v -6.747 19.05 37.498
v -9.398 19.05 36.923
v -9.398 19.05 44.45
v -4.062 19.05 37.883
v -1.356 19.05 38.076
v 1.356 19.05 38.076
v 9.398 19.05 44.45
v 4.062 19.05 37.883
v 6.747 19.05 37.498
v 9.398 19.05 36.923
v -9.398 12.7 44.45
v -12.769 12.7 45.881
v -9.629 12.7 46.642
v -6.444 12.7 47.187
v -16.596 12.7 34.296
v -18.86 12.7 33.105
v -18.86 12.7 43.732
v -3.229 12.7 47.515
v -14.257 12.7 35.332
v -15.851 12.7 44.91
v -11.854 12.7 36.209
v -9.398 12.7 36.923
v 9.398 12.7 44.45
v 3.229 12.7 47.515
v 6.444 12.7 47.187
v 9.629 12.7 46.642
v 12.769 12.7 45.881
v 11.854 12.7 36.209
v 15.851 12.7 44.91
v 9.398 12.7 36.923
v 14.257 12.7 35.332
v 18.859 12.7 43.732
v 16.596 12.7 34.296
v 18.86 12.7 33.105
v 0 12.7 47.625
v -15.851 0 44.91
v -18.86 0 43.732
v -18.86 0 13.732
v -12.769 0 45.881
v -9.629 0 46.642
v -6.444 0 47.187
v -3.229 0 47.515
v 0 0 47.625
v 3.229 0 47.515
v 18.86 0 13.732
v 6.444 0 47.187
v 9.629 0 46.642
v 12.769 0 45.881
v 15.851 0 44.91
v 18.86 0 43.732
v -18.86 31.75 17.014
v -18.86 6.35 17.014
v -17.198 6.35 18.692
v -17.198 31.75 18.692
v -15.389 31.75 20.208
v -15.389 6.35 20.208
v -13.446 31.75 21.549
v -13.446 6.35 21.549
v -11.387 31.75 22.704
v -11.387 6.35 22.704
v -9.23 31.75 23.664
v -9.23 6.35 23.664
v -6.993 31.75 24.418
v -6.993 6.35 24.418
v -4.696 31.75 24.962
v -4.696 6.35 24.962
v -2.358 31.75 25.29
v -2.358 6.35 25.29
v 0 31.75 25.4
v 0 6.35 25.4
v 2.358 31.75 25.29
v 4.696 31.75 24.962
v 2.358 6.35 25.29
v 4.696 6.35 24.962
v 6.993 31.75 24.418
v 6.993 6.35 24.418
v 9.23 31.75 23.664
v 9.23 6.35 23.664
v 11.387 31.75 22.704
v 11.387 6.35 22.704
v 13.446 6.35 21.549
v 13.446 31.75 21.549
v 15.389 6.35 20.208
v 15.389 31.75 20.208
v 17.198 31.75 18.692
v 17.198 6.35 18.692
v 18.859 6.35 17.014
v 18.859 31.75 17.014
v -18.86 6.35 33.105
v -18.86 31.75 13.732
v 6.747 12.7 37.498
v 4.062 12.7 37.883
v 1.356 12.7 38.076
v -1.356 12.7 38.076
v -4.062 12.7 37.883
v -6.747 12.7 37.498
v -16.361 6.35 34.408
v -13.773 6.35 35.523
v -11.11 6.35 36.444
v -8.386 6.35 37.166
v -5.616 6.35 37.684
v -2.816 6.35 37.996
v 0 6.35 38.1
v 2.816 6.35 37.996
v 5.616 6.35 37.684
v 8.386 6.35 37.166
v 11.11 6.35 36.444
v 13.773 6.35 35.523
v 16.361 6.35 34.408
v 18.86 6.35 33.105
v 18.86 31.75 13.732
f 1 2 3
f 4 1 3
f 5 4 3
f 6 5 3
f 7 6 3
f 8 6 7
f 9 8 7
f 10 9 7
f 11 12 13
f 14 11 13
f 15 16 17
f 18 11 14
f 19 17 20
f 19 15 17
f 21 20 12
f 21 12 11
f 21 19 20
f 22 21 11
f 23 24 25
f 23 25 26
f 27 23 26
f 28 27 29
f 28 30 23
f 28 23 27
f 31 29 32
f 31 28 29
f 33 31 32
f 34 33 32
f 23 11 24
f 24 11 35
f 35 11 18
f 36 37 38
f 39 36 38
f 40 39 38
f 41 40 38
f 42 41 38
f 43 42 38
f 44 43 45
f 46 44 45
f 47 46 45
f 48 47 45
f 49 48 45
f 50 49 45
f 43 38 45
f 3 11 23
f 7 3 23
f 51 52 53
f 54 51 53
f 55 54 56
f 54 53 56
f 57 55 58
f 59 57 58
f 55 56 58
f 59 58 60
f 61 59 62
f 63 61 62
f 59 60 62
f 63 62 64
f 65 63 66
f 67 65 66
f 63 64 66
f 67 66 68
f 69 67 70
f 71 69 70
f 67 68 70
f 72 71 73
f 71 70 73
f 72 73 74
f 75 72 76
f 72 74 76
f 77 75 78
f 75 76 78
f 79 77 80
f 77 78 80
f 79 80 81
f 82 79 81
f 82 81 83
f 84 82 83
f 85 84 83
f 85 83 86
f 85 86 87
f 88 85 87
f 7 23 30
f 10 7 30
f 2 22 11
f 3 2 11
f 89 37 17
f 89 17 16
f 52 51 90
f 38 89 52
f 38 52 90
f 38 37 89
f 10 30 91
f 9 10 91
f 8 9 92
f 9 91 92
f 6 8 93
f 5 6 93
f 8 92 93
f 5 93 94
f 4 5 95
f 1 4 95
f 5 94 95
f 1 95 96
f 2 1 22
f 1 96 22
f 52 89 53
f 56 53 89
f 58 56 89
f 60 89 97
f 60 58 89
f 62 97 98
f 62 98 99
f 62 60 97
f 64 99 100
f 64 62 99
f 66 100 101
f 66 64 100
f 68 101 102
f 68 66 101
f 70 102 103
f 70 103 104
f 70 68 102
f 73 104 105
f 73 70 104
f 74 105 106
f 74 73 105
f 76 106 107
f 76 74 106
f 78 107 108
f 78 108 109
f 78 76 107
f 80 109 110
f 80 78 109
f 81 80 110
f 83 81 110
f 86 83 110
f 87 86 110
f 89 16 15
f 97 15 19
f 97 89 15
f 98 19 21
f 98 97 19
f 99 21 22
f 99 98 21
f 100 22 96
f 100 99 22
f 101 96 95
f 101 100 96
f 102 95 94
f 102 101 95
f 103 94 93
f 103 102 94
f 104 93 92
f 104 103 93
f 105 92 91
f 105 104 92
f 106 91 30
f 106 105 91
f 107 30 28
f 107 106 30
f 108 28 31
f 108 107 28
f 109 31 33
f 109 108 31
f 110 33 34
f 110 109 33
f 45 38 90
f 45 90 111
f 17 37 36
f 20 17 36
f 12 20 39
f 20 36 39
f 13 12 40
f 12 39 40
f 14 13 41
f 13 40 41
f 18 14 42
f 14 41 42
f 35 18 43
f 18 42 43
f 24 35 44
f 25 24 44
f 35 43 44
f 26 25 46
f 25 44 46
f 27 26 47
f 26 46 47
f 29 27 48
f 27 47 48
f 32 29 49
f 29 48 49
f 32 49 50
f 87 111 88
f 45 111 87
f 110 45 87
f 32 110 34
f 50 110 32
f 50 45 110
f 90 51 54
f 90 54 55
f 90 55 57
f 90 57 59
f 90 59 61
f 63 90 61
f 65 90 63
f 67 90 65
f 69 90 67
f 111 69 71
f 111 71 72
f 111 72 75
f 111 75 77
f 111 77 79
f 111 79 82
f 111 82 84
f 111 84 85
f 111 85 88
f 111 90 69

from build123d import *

# Parameters (mm, degrees)
SKETCH1_R           = 38.1
BOSS_EXTRUDE1_DEPTH = 6.35
SKETCH2_R           = 25.4
BOSS_EXTRUDE2_DEPTH = 25.4
SKETCH3_R           = 47.625
SKETCH3_R_2         = 38.1
BOSS_EXTRUDE3_DEPTH = 12.7
CUT_EXTRUDE3_DEPTH  = 32.75
BOSS_EXTRUDE4_DEPTH = 6.35


with BuildPart() as part:
    # Sketch1 → Boss-Extrude1 (new body)
    with BuildSketch(Plane(origin=(0, 0, 0), x_dir=(1, 0, 0), z_dir=(0, 1, 0))):
        Circle(SKETCH1_R)
    extrude(amount=BOSS_EXTRUDE1_DEPTH)

    # Sketch2 → Boss-Extrude2 (add)
    with BuildSketch(Plane(origin=(0, 6.35, 0), x_dir=(1, 0, 0), z_dir=(0, 1, 0))):
        Circle(SKETCH2_R)
    extrude(amount=BOSS_EXTRUDE2_DEPTH)

    # Sketch3 → Boss-Extrude3 (add)
    with BuildSketch(Plane(origin=(0, 0, 0), x_dir=(1, 0, 0), z_dir=(0, 1, 0))):
        Circle(SKETCH3_R)
        Circle(SKETCH3_R_2, mode=Mode.SUBTRACT)
    extrude(amount=BOSS_EXTRUDE3_DEPTH)

    # Sketch4 → Cut-Extrude3 (cut, through all)
    with BuildSketch(Plane(origin=(0, 0, 0), x_dir=(1, 0, 0), z_dir=(0, 1, 0))):
        Polygon((-18.8595, -13.731963353), (18.8595, -13.731963353), (18.8595, -50.573816251), (47.625, -50.573816251), (47.625, 47.625), (19.007906819, 47.625), (-18.8595, 47.625), (-47.625, 47.625), (-47.625, -44.321865457), (-18.8595, -44.321865457), align=None)
    extrude(amount=CUT_EXTRUDE3_DEPTH, mode=Mode.SUBTRACT)

    # Sketch5 → Boss-Extrude4 (add)
    with BuildSketch(Plane(origin=(0, 12.7, 0), x_dir=(1, 0, 0), z_dir=(0, 1, 0))):
        with BuildLine():
            Line((-9.398, -44.45), (9.398, -44.45))
            Line((9.398, -44.45), (9.398, -36.922724656))
            ThreePointArc((9.398, -36.922724656), (0, -38.1), (-9.398, -36.922724656))
            Line((-9.398, -36.922724656), (-9.398, -44.45))
        make_face()
    extrude(amount=BOSS_EXTRUDE4_DEPTH)


solid = part.part
